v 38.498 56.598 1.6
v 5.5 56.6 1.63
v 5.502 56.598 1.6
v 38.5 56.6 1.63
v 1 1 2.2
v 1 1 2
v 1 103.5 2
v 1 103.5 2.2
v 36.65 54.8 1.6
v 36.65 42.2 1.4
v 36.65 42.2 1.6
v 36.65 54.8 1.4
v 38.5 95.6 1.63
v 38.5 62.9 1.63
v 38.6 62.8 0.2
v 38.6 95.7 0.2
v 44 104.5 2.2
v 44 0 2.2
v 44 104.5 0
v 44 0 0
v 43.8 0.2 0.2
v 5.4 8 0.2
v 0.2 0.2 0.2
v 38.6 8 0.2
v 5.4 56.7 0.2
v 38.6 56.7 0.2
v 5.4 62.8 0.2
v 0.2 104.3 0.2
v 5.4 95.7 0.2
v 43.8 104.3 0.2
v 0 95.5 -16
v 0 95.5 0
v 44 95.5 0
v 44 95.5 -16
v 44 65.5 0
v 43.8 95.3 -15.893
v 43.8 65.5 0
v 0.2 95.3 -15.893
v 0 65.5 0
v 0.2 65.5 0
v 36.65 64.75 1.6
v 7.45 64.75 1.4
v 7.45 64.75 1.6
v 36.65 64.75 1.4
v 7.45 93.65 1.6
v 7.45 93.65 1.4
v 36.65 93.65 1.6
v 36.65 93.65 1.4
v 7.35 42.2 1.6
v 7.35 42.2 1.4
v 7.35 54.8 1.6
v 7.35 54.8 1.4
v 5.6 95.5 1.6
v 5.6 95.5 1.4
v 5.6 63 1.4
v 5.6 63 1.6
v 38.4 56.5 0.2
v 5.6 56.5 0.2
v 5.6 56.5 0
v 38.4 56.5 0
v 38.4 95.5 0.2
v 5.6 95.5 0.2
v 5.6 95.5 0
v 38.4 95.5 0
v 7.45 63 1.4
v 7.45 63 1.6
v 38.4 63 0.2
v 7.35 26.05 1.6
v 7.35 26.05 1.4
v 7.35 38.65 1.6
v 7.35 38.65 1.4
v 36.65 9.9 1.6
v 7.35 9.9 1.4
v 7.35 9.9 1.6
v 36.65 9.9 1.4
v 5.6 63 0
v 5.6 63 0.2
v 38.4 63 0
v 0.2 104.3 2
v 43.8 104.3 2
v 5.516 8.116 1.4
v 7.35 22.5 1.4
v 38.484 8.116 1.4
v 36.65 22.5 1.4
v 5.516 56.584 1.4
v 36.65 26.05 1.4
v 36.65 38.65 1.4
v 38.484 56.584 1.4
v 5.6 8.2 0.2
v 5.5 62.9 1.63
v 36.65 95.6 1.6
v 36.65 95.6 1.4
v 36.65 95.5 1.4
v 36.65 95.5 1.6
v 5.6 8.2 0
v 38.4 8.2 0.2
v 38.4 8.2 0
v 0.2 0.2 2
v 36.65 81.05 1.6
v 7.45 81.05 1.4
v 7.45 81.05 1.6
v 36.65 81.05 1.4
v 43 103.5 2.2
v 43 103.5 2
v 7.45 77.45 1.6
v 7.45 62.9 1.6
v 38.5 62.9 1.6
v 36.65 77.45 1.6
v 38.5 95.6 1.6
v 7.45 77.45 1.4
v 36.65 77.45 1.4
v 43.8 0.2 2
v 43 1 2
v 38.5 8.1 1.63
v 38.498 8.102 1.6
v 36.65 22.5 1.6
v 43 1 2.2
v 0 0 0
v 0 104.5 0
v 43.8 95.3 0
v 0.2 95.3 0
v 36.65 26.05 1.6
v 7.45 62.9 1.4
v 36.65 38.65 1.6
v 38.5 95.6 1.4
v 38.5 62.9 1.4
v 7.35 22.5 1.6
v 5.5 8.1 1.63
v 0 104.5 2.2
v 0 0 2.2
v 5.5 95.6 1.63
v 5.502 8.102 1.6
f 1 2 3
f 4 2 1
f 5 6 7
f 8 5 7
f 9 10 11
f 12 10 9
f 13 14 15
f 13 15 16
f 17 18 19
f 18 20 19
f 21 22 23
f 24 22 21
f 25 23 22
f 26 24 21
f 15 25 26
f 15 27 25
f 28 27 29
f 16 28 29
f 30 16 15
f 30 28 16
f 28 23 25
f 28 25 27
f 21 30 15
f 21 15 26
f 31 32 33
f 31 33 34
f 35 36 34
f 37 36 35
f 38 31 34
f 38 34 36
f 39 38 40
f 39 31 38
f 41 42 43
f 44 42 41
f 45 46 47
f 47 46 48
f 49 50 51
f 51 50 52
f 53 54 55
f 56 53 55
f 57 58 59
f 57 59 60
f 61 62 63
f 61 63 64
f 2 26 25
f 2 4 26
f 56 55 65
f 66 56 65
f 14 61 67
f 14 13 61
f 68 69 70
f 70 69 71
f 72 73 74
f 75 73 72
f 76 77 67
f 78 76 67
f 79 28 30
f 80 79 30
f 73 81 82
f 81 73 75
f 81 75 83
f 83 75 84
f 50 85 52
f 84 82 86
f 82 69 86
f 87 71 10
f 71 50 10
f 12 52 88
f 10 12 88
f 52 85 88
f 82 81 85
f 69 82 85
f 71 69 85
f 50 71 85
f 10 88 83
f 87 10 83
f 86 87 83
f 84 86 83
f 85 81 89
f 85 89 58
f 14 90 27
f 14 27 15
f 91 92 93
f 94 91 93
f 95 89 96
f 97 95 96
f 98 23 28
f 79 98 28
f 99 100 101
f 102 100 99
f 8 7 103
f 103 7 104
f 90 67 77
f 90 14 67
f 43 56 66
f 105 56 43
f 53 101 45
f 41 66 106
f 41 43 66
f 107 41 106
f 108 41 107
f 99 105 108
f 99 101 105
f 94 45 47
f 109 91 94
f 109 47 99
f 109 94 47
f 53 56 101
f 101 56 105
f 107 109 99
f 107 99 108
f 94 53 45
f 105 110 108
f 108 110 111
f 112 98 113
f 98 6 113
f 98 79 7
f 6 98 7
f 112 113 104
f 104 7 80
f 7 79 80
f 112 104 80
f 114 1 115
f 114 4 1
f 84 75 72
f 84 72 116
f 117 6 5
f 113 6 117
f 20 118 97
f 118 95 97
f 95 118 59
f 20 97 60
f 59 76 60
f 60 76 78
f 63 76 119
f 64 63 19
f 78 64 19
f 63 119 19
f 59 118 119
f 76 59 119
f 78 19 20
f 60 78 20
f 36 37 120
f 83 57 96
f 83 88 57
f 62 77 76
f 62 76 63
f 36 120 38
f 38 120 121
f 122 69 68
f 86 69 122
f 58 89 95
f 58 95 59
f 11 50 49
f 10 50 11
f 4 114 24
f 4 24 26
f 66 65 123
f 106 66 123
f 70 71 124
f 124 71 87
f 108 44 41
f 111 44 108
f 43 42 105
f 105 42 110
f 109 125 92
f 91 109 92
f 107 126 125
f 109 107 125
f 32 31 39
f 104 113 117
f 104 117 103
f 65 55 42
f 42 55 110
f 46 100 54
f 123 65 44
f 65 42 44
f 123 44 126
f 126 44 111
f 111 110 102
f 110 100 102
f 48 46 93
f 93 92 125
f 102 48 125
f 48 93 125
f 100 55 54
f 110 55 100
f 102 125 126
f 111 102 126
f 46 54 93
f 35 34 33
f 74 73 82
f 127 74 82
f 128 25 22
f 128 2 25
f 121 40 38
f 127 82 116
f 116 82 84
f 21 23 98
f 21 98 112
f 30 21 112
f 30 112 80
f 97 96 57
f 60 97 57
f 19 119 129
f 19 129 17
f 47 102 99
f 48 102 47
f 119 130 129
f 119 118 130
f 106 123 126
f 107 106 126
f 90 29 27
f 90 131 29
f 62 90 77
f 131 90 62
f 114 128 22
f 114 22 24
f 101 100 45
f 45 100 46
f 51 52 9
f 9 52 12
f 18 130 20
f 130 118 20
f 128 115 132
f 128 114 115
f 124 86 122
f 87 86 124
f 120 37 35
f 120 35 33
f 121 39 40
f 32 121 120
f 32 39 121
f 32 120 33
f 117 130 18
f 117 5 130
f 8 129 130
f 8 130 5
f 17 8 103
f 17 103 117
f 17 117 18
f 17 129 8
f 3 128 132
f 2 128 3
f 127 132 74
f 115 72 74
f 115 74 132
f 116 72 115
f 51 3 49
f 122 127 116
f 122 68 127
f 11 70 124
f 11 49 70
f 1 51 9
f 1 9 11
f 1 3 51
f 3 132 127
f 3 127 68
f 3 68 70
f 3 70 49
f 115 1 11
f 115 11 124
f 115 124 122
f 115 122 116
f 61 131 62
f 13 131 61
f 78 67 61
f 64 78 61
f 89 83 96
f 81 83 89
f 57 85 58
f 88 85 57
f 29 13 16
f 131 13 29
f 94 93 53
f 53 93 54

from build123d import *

# Parameters (mm, degrees)
SKETCH_1_W          = 44
SKETCH_1_H          = 104.5
EXTRUDE_1_DEPTH     = 2
SHELL_1_T           = -0.2
SKETCH_2_W          = 32.8
SKETCH_2_H          = 32.5
SKETCH_2_H_2        = 48.3
CUT_EXTRUDE_1_DEPTH = 2
SKETCH_3_W          = 33.2
SKETCH_3_H          = 32.9
SKETCH_3_W_2        = 32.8
SKETCH_3_H_2        = 32.5
SKETCH_3_H_3        = 48.7
SKETCH_3_H_4        = 48.3
EXTRUDE_2_DEPTH     = 1.8
EXTRUDE_2_TAPER     = 4
SKETCH_6_W          = 29.2
SKETCH_6_H          = 12.7
SKETCH_6_H_2        = 12.6
EXTRUDE_3_DEPTH     = 0.2
SKETCH_7_W          = 33
SKETCH_7_H          = 48.5
SKETCH_7_W_2        = 29.3
SKETCH_7_H_2        = 12.6
EXTRUDE_4_DEPTH     = 0.2
EXTRUDE_6_DEPTH     = 44
SKETCH_12_W         = 43.6
SKETCH_12_H         = 29.8
CUT_EXTRUDE_5_DEPTH = 16
SKETCH_13_W         = 44
SKETCH_13_H         = 104.5
SKETCH_13_W_2       = 42
SKETCH_13_H_2       = 102.5
EXTRUDE_7_DEPTH     = 0.2


with BuildPart() as part:
    # 스케치1 → 보스-돌출1 (new body)
    with BuildSketch(Plane.XY):
        with Locations((22, 52.25)):
            Rectangle(SKETCH_1_W, SKETCH_1_H)
    extrude(amount=EXTRUDE_1_DEPTH)

    # 쉘1
    shell_1_openings = [part.faces().sort_by_distance(p)[0] for p in [
        (22, 52.25, 2),
    ]]
    offset(amount=SHELL_1_T, openings=shell_1_openings, kind=Kind.INTERSECTION)

    # 스케치2 → 컷-돌출1 (cut)
    with BuildSketch(Plane.XY.offset(0.2)):
        with Locations((22, 79.25)):
            Rectangle(SKETCH_2_W, SKETCH_2_H)
        with Locations((22, 32.35)):
            Rectangle(SKETCH_2_W, SKETCH_2_H_2)
    extrude(amount=-CUT_EXTRUDE_1_DEPTH, mode=Mode.SUBTRACT)

    # 스케치3 → 보스-돌출2 (add)
    # profile 1 of 2: a face of its own
    with BuildSketch(Plane.XY.offset(0.2)):
        with Locations((22, 79.25)):
            Rectangle(SKETCH_3_W, SKETCH_3_H)
        with Locations((22, 79.25)):
            Rectangle(SKETCH_3_W_2, SKETCH_3_H_2, mode=Mode.SUBTRACT)
    # profile 2 of 2: a face of its own
    with BuildSketch(Plane.XY.offset(0.2)):
        with Locations((22, 32.35)):
            Rectangle(SKETCH_3_W, SKETCH_3_H_3)
        with Locations((22, 32.35)):
            Rectangle(SKETCH_3_W_2, SKETCH_3_H_4, mode=Mode.SUBTRACT)
    extrude(amount=EXTRUDE_2_DEPTH, taper=EXTRUDE_2_TAPER)

    # 스케치7 → 보스-돌출4 (add)
    with BuildSketch(Plane.XY.offset(1.4)):
        with Locations((22, 32.35)):
            Rectangle(SKETCH_7_W, SKETCH_7_H)
        with Locations((22, 16.2)):
            Rectangle(SKETCH_7_W_2, SKETCH_7_H_2, mode=Mode.SUBTRACT)
        with Locations((22, 32.35)):
            Rectangle(SKETCH_7_W_2, SKETCH_7_H_2, mode=Mode.SUBTRACT)
        with Locations((22, 48.5)):
            Rectangle(SKETCH_7_W_2, SKETCH_7_H_2, mode=Mode.SUBTRACT)
    extrude(amount=EXTRUDE_4_DEPTH)

    # 스케치13 → 보스-돌출7 (add)
    with BuildSketch(Plane.XY.offset(2)):
        with Locations((22, 52.25)):
            Rectangle(SKETCH_13_W, SKETCH_13_H)
        with Locations((22, 52.25)):
            Rectangle(SKETCH_13_W_2, SKETCH_13_H_2, mode=Mode.SUBTRACT)
    extrude(amount=EXTRUDE_7_DEPTH)


with BuildPart() as body_2:
    # 스케치6 → 보스-돌출3 (new body)
    with BuildSketch(Plane.XY.offset(1.4)):
        Polygon((5.6, 95.5), (5.6, 63), (7.45, 63), (7.45, 62.9), (38.5, 62.9), (38.5, 95.6), (36.65, 95.6), (36.65, 95.5), align=None)
        with Locations((22.05, 71.1)):
            Rectangle(SKETCH_6_W, SKETCH_6_H, mode=Mode.SUBTRACT)
        with Locations((22.05, 87.35)):
            Rectangle(SKETCH_6_W, SKETCH_6_H_2, mode=Mode.SUBTRACT)
    extrude(amount=EXTRUDE_3_DEPTH)


with BuildPart() as body_3:
    # 스케치11 → 보스-돌출6 (new body)
    with BuildSketch(Plane.ZY):
        Polygon((0, 95.5), (-16, 95.5), (0, 65.5), align=None)
    extrude(amount=-EXTRUDE_6_DEPTH)

    # 스케치12 → 컷-돌출5 (cut)
    with BuildSketch(Plane(origin=(0, 0, 0), x_dir=(-1, 0, 0), z_dir=(0, 0, -1))):
        with Locations((-22, 80.4)):
            Rectangle(SKETCH_12_W, SKETCH_12_H)
    extrude(amount=CUT_EXTRUDE_5_DEPTH, mode=Mode.SUBTRACT)


solid = Compound([part.part, body_2.part, body_3.part])
